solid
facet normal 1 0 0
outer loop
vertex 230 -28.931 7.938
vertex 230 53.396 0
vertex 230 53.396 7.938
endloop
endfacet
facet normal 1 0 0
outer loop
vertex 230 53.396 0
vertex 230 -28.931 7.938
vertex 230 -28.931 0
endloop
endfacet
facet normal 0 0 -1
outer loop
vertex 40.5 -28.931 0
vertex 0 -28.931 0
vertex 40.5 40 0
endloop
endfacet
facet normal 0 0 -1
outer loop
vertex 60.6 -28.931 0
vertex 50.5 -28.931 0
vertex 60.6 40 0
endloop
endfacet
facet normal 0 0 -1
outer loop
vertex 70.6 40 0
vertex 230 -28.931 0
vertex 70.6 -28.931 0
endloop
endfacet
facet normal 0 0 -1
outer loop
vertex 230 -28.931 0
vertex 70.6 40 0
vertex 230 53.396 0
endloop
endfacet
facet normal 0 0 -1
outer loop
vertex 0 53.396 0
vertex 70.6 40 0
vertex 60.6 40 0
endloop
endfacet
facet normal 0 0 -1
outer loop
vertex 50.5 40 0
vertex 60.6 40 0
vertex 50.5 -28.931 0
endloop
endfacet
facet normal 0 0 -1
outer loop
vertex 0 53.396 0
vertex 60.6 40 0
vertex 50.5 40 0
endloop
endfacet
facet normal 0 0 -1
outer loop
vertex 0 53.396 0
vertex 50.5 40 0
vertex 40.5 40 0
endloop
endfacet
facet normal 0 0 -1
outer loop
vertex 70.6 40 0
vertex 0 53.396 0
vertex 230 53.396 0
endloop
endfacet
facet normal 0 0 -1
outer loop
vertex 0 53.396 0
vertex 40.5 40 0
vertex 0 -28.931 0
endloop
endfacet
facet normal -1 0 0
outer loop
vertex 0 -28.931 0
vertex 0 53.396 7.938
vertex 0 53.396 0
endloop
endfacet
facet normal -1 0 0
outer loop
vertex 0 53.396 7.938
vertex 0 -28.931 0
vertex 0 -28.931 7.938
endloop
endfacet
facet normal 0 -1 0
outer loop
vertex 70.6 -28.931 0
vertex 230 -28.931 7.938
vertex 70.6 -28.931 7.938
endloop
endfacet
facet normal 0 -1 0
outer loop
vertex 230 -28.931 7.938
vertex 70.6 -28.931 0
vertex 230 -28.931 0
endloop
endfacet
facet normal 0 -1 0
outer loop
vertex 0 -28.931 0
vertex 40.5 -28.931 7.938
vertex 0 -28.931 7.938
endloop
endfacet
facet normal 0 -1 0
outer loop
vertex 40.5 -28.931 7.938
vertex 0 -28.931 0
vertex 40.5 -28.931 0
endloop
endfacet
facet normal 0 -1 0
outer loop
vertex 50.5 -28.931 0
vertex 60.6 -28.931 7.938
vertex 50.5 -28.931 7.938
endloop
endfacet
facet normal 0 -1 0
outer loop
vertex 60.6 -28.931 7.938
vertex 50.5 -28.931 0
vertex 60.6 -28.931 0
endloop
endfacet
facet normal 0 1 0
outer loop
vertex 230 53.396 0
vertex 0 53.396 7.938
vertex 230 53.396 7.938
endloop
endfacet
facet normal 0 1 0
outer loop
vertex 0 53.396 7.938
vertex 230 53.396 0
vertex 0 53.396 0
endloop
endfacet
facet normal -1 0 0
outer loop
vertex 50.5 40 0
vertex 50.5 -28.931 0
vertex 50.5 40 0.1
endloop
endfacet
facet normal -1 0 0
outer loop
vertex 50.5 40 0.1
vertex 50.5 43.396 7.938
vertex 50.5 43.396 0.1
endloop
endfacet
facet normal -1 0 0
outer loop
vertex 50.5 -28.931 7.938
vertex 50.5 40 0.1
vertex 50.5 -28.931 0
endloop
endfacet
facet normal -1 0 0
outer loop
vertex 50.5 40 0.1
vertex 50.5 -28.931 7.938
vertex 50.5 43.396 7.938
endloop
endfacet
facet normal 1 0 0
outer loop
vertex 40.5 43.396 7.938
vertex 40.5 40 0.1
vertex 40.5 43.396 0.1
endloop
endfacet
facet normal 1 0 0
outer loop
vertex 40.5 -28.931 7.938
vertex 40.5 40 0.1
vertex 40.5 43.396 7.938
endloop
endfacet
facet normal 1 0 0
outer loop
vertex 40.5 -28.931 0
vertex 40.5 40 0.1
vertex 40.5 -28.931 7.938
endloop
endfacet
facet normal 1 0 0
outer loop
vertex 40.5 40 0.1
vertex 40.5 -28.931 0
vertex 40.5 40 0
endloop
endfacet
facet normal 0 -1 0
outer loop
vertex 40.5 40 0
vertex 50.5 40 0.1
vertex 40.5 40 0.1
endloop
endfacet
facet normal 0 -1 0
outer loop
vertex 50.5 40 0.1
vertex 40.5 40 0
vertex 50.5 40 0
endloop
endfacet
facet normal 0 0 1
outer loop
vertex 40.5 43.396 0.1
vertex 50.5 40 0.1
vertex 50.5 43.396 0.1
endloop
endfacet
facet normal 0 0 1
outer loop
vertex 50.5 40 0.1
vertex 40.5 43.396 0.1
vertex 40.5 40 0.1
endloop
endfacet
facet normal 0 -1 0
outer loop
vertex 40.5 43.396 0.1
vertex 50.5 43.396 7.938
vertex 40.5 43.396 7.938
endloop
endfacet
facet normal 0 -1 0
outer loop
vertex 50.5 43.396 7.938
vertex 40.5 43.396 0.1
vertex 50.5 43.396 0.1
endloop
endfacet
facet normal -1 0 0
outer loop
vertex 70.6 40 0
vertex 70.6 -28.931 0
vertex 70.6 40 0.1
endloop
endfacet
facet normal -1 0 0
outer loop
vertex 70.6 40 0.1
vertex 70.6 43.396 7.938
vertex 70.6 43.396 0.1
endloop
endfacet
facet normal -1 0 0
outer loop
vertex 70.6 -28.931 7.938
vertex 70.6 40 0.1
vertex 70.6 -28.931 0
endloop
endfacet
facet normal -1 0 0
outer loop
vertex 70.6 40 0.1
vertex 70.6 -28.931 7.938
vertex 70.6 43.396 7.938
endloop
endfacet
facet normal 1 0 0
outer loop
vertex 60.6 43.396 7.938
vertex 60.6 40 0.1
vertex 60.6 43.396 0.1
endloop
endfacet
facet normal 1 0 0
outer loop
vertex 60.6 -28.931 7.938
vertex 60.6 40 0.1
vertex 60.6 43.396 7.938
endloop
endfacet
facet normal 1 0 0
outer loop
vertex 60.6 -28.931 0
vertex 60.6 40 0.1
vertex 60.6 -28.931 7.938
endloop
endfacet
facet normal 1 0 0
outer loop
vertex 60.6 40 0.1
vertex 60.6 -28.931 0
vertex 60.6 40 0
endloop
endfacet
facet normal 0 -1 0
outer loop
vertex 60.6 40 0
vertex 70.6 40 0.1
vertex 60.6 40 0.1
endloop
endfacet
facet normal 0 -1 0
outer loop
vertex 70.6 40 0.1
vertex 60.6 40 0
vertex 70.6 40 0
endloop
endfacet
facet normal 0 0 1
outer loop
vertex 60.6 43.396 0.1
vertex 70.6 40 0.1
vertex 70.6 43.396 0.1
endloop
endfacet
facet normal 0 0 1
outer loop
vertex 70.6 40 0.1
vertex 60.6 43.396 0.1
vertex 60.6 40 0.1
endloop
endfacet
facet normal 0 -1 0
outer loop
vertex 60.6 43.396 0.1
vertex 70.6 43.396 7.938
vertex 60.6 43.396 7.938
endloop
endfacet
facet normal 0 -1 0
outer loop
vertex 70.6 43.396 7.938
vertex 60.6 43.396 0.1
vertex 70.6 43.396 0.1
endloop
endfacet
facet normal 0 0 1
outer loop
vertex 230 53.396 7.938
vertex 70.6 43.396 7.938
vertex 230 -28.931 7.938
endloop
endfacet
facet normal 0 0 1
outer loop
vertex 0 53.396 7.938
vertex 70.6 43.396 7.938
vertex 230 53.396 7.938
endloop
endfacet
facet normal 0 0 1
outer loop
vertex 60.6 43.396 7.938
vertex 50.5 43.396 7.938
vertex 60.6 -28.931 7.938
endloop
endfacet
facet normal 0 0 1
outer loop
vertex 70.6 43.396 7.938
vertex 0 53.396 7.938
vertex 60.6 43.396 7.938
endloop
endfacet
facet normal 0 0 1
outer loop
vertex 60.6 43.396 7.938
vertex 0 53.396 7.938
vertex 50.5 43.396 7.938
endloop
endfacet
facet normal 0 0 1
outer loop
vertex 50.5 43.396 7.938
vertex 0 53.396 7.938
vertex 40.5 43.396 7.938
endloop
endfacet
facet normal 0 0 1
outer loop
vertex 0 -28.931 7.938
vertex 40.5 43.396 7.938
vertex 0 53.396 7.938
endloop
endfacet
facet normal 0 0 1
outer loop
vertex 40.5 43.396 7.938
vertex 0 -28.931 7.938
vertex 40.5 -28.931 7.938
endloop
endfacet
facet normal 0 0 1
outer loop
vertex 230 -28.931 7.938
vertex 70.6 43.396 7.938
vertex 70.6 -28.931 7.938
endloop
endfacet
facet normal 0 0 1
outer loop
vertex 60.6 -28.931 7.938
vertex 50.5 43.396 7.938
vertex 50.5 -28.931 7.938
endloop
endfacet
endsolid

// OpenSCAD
$fn=100;
MM = 25.42;
FUDGE = 1;

inkbird_width = 112 + 97 + FUDGE;
inkbird_depth = (3 + 3/8) * MM + FUDGE;
inkbird_heigth = 35; // (1 + 3/8) * MM + FUDGE;

thick = 10;

module make_box()
{
    translate([0, -inkbird_depth/3, 0])
    color("GREEN")
    cube([inkbird_width + thick *2 , inkbird_depth/2 , thick+.1], center = false);

    difference()
    {
        cube([inkbird_width + thick *2, (inkbird_depth + thick)/2, inkbird_heigth + thick], center = false);
        translate([thick, thick, thick +.01])
        cube([inkbird_width , inkbird_depth, inkbird_heigth], center = false);
    }

    translate([0, (inkbird_depth + thick)/2, 0])
    color("BLUE")
    cube([inkbird_width + thick *2 , thick/2 , thick + 9], center = false);

    // front display is not flat but 2 steps. Add shim to pin it against wall.
    SHIM_LEN = 120;
    SHIM_THICK = 3;
    color("MAGENTA")
    translate([inkbird_width - SHIM_LEN + 20, (inkbird_depth + thick)/2 - SHIM_THICK])
    cube([inkbird_width + thick - SHIM_LEN , thick/2 , thick + 9], center = false);
}

module thermo_hole(x_offset)
{
    translate([x_offset + thick/2 + FUDGE, -60/2, -5])
    cube([ thick, 70, 10]);

    ////// FIX ADD 30 
    color("CYAN")
    translate([x_offset + thick/2 + FUDGE, -30, +.1])
    cube([ thick , inkbird_depth/2 + 30, 10]);
}

tweak=20/64 * 25.4;

difference()
{
    difference()
    {
        make_box();
        thermo_hole(34.5);
        thermo_hole(54.6);
        translate( [ -50, -50, tweak])
        #cube([1000, 1000,  50]); 
    }
}
